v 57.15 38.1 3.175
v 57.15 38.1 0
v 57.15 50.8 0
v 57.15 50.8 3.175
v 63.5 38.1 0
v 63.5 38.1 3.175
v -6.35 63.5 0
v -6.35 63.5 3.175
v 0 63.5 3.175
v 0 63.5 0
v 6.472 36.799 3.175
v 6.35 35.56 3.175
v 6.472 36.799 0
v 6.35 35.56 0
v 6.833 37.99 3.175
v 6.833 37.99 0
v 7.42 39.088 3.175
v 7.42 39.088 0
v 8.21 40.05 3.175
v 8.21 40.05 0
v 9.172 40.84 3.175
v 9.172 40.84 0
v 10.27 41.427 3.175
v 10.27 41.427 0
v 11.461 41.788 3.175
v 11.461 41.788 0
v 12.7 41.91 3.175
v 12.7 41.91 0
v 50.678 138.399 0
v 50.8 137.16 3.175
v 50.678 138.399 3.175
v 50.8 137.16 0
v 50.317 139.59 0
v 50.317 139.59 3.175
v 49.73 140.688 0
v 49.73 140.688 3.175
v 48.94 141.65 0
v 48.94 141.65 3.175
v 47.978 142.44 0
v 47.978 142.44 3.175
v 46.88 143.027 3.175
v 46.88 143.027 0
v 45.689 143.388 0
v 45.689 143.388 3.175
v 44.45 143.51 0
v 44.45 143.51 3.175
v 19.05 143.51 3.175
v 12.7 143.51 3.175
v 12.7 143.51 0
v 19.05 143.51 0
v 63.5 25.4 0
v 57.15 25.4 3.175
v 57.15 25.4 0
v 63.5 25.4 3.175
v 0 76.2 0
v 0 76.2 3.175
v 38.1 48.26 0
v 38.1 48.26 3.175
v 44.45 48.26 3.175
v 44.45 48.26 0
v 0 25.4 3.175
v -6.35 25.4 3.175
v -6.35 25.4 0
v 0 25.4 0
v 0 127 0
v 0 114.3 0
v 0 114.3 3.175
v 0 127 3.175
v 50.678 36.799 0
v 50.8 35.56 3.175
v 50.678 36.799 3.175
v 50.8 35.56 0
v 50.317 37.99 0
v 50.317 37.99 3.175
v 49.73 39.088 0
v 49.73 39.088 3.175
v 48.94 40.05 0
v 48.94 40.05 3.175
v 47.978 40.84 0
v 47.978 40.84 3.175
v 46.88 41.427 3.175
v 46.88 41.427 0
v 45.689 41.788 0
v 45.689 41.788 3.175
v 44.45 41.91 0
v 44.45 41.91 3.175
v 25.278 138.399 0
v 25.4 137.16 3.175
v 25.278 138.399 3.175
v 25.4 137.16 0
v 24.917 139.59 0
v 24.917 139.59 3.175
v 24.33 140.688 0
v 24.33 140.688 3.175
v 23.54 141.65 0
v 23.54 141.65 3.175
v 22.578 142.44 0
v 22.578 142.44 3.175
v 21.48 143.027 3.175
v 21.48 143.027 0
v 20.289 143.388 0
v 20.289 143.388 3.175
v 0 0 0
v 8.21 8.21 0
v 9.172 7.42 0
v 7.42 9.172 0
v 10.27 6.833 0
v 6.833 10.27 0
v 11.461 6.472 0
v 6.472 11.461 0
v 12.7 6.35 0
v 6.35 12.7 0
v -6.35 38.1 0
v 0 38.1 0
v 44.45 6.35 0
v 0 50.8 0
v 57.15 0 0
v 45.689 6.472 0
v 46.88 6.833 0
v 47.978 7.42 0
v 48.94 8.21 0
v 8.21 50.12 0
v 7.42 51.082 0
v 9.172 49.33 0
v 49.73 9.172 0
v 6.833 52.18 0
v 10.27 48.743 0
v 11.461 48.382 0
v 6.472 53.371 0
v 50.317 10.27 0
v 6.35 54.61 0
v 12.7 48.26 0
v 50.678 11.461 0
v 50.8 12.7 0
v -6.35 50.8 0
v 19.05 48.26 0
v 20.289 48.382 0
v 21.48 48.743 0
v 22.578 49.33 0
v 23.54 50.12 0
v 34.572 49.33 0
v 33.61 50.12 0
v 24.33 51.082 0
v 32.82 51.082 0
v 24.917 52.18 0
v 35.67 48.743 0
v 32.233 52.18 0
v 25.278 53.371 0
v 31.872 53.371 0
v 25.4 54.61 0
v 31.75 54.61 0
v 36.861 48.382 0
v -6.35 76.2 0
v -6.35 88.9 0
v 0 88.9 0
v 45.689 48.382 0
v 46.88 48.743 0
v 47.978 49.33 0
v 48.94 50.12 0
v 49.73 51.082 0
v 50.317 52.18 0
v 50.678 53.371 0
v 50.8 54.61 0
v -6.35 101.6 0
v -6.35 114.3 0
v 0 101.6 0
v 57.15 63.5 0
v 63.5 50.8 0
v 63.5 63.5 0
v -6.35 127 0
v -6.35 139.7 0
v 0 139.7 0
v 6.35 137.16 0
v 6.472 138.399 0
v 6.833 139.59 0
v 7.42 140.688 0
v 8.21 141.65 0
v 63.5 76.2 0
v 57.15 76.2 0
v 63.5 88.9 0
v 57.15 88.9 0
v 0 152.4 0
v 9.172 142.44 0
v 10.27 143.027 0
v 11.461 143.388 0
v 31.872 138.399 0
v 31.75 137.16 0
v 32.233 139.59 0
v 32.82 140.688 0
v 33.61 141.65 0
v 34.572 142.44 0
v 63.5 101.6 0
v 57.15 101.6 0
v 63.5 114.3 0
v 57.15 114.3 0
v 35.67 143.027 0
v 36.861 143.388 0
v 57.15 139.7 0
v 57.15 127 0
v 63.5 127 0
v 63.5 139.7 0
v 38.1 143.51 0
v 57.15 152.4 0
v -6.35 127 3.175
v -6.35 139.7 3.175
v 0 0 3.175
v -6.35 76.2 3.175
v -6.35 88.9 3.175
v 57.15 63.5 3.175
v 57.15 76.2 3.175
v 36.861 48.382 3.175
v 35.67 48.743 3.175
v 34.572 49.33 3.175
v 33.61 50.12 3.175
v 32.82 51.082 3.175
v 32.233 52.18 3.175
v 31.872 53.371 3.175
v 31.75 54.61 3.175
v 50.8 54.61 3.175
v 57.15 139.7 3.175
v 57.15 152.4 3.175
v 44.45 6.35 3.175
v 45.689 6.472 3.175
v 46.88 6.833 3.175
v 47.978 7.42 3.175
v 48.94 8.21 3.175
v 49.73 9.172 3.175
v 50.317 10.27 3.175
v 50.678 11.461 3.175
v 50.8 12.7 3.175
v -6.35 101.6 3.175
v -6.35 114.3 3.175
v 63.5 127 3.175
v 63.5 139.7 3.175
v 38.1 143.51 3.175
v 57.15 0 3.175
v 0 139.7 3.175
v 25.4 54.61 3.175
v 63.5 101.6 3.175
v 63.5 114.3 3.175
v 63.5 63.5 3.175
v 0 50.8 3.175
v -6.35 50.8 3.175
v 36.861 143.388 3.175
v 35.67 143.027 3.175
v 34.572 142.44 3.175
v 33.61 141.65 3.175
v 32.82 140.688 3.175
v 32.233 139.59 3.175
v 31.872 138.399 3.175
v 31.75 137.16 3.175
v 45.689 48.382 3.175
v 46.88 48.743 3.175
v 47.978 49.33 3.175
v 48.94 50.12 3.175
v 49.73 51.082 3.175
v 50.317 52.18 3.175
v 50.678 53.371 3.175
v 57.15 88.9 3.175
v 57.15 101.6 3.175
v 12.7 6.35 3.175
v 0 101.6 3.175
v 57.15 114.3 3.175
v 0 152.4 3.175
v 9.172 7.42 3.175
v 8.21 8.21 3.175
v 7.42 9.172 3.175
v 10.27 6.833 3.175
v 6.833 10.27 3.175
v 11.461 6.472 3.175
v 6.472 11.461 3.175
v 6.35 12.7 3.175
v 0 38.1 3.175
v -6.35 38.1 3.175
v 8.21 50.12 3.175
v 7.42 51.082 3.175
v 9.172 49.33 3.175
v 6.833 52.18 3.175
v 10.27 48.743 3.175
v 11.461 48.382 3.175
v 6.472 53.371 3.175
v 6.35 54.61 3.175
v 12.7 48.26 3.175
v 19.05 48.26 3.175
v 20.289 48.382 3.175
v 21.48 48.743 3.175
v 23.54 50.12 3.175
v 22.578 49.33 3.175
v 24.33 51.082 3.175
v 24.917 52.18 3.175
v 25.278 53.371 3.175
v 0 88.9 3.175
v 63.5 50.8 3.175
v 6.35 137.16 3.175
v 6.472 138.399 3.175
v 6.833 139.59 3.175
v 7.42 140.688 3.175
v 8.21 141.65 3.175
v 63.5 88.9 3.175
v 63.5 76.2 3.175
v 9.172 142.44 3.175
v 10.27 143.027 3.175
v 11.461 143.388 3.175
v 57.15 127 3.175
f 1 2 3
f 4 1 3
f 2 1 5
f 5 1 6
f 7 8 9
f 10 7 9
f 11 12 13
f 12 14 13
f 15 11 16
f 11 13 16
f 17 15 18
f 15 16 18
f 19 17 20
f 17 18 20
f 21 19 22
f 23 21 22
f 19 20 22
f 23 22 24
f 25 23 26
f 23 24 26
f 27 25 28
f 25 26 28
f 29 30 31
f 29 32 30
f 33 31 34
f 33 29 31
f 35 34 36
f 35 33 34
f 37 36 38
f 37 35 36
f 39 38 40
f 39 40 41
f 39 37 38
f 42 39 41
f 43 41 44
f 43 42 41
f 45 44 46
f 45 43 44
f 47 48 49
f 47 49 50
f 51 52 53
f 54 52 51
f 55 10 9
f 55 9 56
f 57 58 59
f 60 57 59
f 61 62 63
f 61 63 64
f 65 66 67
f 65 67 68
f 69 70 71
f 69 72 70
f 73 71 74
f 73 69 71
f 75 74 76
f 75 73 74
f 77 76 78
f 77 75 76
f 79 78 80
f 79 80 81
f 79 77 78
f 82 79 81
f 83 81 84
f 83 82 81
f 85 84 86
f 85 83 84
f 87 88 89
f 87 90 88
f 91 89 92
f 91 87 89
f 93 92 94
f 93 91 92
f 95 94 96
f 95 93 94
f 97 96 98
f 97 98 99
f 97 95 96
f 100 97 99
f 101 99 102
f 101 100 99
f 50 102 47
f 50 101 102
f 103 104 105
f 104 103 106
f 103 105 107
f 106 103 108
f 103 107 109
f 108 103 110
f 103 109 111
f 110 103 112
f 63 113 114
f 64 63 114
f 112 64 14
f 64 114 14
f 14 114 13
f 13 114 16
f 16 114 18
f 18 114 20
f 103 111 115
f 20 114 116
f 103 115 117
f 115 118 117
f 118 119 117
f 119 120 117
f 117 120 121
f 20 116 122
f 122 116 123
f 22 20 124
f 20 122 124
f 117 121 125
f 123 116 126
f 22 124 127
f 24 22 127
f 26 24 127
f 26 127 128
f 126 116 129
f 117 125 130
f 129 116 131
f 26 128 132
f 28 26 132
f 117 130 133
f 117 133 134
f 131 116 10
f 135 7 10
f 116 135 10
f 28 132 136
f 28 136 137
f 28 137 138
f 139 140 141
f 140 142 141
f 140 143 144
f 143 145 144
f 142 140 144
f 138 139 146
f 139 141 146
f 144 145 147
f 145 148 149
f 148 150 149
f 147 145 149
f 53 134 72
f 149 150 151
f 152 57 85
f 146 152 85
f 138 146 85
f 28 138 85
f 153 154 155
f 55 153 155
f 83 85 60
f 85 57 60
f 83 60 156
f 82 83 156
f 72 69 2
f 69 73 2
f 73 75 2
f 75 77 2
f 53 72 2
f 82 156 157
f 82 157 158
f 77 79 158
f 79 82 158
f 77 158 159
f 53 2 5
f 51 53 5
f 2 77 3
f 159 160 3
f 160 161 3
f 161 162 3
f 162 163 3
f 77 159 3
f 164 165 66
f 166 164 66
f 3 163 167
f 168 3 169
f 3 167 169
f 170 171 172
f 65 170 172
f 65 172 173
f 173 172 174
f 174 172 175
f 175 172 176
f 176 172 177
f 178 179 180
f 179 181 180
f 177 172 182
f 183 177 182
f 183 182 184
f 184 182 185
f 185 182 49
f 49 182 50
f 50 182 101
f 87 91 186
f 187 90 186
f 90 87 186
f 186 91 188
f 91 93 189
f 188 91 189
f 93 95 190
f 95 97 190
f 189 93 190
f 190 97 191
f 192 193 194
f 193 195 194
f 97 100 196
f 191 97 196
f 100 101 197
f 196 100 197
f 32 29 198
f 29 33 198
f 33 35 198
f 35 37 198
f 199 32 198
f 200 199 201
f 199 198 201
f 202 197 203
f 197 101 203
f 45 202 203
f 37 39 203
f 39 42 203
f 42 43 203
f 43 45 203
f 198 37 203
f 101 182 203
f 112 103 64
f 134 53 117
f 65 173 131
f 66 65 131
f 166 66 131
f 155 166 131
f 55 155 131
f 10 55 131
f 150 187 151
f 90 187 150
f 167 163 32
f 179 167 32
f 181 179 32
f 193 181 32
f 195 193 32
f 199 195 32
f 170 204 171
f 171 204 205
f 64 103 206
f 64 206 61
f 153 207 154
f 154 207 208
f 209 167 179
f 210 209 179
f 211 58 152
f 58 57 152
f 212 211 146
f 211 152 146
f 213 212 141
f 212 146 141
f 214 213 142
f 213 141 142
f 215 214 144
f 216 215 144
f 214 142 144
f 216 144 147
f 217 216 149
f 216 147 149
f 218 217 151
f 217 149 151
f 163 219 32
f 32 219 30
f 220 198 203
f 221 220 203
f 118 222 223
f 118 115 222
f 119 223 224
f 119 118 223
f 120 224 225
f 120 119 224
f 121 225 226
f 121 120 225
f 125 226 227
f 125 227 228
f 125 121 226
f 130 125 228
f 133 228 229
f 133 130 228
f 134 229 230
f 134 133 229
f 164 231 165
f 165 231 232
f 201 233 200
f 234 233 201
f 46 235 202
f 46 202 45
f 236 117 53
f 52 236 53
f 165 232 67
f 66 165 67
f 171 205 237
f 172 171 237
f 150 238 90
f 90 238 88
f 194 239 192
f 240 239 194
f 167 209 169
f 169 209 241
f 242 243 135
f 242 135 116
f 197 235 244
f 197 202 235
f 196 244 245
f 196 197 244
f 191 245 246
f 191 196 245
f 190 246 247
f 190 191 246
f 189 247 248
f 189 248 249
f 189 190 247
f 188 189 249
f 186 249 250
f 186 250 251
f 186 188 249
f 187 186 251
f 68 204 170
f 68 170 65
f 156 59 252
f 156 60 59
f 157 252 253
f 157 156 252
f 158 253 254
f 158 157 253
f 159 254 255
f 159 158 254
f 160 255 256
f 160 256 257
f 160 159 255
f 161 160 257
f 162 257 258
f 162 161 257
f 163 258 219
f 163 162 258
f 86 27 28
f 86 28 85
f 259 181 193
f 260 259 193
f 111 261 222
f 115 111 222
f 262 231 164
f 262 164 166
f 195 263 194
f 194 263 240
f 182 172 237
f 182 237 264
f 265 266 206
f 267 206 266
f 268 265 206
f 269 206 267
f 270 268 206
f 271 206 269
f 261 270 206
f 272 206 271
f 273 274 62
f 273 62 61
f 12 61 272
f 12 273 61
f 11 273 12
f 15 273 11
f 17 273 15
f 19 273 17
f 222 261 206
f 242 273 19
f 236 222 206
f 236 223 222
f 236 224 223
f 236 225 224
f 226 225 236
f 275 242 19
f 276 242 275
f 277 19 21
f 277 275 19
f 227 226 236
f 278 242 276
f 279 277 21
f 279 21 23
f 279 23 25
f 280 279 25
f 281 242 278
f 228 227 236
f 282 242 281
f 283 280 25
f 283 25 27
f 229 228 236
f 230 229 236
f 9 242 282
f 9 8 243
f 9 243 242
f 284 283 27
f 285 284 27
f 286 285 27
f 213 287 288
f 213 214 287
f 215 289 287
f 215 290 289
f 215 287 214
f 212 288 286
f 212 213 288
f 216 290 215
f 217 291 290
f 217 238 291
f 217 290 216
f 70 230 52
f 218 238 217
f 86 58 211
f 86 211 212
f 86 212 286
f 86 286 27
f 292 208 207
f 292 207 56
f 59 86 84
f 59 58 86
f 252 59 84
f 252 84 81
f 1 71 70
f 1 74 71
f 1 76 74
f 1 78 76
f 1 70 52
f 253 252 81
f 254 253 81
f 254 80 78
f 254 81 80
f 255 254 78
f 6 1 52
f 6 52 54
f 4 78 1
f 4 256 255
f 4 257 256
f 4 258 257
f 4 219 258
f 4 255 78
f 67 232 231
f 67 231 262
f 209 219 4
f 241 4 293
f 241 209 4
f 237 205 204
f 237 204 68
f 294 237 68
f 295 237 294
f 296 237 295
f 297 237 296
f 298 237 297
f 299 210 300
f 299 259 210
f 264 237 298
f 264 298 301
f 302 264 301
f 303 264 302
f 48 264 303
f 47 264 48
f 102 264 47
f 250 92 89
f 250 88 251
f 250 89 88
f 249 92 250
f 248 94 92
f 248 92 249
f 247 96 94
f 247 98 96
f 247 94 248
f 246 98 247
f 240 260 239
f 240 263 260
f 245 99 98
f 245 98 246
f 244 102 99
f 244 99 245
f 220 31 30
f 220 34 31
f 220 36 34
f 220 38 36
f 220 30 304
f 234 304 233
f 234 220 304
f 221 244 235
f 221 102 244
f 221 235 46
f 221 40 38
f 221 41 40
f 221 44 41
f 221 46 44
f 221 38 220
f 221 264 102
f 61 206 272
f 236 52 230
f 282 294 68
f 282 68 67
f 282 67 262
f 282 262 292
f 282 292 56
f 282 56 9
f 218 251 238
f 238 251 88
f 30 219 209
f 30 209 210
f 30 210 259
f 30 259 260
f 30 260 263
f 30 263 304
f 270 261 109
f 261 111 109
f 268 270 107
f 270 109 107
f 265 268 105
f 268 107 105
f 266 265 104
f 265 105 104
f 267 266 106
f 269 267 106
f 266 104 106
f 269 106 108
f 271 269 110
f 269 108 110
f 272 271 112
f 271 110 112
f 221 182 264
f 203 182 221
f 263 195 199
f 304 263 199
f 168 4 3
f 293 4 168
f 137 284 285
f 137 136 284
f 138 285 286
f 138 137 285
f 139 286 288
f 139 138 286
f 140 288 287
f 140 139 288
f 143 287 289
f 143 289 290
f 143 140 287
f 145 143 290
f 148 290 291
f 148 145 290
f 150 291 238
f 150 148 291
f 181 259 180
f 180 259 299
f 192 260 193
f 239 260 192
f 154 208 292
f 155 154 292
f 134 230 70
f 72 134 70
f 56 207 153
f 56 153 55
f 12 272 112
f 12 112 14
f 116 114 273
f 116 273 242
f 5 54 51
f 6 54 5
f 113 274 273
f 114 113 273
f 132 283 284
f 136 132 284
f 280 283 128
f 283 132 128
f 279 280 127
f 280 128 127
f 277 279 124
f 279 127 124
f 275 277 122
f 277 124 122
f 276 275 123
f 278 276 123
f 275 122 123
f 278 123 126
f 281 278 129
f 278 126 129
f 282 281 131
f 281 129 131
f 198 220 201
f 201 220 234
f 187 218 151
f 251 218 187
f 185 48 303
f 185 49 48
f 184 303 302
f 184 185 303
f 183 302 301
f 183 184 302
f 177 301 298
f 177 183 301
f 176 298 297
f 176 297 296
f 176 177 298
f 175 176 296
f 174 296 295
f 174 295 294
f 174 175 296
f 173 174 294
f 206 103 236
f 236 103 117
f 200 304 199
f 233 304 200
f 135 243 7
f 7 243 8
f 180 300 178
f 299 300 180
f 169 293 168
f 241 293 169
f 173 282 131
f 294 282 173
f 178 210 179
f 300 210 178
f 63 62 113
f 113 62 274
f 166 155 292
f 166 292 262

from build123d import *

# Parameters (mm, degrees)
SKETCH1_W           = 57.15
SKETCH1_H           = 152.4
BOSS_EXTRUDE1_DEPTH = 3.175
SKETCH2_W           = 6.35
SKETCH2_H           = 12.7
BOSS_EXTRUDE2_DEPTH = 3.175
LPATTERN1_COUNT     = 5
LPATTERN1_PITCH     = 25.4
SKETCH3_W           = 44.45
SKETCH3_H           = 35.56
CUT_EXTRUDE1_DEPTH  = 3.175
SKETCH4_W           = 19.05
SKETCH4_H           = 95.25
CUT_EXTRUDE2_DEPTH  = 3.175
FILLET1_R           = 6.35


with BuildPart() as part:
    # Sketch1 → Boss-Extrude1 (new body)
    with BuildSketch(Plane.XY):
        with Locations((28.575, 76.2)):
            Rectangle(SKETCH1_W, SKETCH1_H)
    extrude(amount=BOSS_EXTRUDE1_DEPTH)

    # Sketch2 → Boss-Extrude2 (add)
    with BuildSketch(Plane.XY.offset(3.175)):
        with Locations((-3.175, 133.35)):
            Rectangle(SKETCH2_W, SKETCH2_H)
        with Locations((60.325, 133.35)):
            Rectangle(SKETCH2_W, SKETCH2_H)
    boss_extrude2 = extrude(amount=-BOSS_EXTRUDE2_DEPTH)

    # LPattern1: Boss-Extrude2 ×5
    with Locations(*[(0, -i * LPATTERN1_PITCH, 0) for i in range(1, LPATTERN1_COUNT)]):
        add(boss_extrude2)

    # Sketch3 → Cut-Extrude1 (cut)
    with BuildSketch(Plane.XY.offset(3.175)):
        with Locations((28.575, 24.13)):
            Rectangle(SKETCH3_W, SKETCH3_H)
    extrude(amount=-CUT_EXTRUDE1_DEPTH, mode=Mode.SUBTRACT)

    # Sketch4 → Cut-Extrude2 (cut)
    with BuildSketch(Plane.XY.offset(3.175)):
        with Locations((15.875, 95.885)):
            Rectangle(SKETCH4_W, SKETCH4_H)
        with Locations((41.275, 95.885)):
            Rectangle(SKETCH4_W, SKETCH4_H)
    extrude(amount=-CUT_EXTRUDE2_DEPTH, mode=Mode.SUBTRACT)

    # Fillet1
    fillet1_edges = [part.edges().sort_by_distance(p)[0] for p in [
        (6.35, 6.35, 1.5875),
        (6.35, 41.91, 1.5875),
        (50.8, 41.91, 1.5875),
        (50.8, 6.35, 1.5875),
        (6.35, 48.26, 1.5875),
        (6.35, 143.51, 1.5875),
        (25.4, 143.51, 1.5875),
        (25.4, 48.26, 1.5875),
        (31.75, 48.26, 1.5875),
        (31.75, 143.51, 1.5875),
        (50.8, 143.51, 1.5875),
        (50.8, 48.26, 1.5875),
    ]]
    fillet(fillet1_edges, radius=FILLET1_R)


solid = part.part
